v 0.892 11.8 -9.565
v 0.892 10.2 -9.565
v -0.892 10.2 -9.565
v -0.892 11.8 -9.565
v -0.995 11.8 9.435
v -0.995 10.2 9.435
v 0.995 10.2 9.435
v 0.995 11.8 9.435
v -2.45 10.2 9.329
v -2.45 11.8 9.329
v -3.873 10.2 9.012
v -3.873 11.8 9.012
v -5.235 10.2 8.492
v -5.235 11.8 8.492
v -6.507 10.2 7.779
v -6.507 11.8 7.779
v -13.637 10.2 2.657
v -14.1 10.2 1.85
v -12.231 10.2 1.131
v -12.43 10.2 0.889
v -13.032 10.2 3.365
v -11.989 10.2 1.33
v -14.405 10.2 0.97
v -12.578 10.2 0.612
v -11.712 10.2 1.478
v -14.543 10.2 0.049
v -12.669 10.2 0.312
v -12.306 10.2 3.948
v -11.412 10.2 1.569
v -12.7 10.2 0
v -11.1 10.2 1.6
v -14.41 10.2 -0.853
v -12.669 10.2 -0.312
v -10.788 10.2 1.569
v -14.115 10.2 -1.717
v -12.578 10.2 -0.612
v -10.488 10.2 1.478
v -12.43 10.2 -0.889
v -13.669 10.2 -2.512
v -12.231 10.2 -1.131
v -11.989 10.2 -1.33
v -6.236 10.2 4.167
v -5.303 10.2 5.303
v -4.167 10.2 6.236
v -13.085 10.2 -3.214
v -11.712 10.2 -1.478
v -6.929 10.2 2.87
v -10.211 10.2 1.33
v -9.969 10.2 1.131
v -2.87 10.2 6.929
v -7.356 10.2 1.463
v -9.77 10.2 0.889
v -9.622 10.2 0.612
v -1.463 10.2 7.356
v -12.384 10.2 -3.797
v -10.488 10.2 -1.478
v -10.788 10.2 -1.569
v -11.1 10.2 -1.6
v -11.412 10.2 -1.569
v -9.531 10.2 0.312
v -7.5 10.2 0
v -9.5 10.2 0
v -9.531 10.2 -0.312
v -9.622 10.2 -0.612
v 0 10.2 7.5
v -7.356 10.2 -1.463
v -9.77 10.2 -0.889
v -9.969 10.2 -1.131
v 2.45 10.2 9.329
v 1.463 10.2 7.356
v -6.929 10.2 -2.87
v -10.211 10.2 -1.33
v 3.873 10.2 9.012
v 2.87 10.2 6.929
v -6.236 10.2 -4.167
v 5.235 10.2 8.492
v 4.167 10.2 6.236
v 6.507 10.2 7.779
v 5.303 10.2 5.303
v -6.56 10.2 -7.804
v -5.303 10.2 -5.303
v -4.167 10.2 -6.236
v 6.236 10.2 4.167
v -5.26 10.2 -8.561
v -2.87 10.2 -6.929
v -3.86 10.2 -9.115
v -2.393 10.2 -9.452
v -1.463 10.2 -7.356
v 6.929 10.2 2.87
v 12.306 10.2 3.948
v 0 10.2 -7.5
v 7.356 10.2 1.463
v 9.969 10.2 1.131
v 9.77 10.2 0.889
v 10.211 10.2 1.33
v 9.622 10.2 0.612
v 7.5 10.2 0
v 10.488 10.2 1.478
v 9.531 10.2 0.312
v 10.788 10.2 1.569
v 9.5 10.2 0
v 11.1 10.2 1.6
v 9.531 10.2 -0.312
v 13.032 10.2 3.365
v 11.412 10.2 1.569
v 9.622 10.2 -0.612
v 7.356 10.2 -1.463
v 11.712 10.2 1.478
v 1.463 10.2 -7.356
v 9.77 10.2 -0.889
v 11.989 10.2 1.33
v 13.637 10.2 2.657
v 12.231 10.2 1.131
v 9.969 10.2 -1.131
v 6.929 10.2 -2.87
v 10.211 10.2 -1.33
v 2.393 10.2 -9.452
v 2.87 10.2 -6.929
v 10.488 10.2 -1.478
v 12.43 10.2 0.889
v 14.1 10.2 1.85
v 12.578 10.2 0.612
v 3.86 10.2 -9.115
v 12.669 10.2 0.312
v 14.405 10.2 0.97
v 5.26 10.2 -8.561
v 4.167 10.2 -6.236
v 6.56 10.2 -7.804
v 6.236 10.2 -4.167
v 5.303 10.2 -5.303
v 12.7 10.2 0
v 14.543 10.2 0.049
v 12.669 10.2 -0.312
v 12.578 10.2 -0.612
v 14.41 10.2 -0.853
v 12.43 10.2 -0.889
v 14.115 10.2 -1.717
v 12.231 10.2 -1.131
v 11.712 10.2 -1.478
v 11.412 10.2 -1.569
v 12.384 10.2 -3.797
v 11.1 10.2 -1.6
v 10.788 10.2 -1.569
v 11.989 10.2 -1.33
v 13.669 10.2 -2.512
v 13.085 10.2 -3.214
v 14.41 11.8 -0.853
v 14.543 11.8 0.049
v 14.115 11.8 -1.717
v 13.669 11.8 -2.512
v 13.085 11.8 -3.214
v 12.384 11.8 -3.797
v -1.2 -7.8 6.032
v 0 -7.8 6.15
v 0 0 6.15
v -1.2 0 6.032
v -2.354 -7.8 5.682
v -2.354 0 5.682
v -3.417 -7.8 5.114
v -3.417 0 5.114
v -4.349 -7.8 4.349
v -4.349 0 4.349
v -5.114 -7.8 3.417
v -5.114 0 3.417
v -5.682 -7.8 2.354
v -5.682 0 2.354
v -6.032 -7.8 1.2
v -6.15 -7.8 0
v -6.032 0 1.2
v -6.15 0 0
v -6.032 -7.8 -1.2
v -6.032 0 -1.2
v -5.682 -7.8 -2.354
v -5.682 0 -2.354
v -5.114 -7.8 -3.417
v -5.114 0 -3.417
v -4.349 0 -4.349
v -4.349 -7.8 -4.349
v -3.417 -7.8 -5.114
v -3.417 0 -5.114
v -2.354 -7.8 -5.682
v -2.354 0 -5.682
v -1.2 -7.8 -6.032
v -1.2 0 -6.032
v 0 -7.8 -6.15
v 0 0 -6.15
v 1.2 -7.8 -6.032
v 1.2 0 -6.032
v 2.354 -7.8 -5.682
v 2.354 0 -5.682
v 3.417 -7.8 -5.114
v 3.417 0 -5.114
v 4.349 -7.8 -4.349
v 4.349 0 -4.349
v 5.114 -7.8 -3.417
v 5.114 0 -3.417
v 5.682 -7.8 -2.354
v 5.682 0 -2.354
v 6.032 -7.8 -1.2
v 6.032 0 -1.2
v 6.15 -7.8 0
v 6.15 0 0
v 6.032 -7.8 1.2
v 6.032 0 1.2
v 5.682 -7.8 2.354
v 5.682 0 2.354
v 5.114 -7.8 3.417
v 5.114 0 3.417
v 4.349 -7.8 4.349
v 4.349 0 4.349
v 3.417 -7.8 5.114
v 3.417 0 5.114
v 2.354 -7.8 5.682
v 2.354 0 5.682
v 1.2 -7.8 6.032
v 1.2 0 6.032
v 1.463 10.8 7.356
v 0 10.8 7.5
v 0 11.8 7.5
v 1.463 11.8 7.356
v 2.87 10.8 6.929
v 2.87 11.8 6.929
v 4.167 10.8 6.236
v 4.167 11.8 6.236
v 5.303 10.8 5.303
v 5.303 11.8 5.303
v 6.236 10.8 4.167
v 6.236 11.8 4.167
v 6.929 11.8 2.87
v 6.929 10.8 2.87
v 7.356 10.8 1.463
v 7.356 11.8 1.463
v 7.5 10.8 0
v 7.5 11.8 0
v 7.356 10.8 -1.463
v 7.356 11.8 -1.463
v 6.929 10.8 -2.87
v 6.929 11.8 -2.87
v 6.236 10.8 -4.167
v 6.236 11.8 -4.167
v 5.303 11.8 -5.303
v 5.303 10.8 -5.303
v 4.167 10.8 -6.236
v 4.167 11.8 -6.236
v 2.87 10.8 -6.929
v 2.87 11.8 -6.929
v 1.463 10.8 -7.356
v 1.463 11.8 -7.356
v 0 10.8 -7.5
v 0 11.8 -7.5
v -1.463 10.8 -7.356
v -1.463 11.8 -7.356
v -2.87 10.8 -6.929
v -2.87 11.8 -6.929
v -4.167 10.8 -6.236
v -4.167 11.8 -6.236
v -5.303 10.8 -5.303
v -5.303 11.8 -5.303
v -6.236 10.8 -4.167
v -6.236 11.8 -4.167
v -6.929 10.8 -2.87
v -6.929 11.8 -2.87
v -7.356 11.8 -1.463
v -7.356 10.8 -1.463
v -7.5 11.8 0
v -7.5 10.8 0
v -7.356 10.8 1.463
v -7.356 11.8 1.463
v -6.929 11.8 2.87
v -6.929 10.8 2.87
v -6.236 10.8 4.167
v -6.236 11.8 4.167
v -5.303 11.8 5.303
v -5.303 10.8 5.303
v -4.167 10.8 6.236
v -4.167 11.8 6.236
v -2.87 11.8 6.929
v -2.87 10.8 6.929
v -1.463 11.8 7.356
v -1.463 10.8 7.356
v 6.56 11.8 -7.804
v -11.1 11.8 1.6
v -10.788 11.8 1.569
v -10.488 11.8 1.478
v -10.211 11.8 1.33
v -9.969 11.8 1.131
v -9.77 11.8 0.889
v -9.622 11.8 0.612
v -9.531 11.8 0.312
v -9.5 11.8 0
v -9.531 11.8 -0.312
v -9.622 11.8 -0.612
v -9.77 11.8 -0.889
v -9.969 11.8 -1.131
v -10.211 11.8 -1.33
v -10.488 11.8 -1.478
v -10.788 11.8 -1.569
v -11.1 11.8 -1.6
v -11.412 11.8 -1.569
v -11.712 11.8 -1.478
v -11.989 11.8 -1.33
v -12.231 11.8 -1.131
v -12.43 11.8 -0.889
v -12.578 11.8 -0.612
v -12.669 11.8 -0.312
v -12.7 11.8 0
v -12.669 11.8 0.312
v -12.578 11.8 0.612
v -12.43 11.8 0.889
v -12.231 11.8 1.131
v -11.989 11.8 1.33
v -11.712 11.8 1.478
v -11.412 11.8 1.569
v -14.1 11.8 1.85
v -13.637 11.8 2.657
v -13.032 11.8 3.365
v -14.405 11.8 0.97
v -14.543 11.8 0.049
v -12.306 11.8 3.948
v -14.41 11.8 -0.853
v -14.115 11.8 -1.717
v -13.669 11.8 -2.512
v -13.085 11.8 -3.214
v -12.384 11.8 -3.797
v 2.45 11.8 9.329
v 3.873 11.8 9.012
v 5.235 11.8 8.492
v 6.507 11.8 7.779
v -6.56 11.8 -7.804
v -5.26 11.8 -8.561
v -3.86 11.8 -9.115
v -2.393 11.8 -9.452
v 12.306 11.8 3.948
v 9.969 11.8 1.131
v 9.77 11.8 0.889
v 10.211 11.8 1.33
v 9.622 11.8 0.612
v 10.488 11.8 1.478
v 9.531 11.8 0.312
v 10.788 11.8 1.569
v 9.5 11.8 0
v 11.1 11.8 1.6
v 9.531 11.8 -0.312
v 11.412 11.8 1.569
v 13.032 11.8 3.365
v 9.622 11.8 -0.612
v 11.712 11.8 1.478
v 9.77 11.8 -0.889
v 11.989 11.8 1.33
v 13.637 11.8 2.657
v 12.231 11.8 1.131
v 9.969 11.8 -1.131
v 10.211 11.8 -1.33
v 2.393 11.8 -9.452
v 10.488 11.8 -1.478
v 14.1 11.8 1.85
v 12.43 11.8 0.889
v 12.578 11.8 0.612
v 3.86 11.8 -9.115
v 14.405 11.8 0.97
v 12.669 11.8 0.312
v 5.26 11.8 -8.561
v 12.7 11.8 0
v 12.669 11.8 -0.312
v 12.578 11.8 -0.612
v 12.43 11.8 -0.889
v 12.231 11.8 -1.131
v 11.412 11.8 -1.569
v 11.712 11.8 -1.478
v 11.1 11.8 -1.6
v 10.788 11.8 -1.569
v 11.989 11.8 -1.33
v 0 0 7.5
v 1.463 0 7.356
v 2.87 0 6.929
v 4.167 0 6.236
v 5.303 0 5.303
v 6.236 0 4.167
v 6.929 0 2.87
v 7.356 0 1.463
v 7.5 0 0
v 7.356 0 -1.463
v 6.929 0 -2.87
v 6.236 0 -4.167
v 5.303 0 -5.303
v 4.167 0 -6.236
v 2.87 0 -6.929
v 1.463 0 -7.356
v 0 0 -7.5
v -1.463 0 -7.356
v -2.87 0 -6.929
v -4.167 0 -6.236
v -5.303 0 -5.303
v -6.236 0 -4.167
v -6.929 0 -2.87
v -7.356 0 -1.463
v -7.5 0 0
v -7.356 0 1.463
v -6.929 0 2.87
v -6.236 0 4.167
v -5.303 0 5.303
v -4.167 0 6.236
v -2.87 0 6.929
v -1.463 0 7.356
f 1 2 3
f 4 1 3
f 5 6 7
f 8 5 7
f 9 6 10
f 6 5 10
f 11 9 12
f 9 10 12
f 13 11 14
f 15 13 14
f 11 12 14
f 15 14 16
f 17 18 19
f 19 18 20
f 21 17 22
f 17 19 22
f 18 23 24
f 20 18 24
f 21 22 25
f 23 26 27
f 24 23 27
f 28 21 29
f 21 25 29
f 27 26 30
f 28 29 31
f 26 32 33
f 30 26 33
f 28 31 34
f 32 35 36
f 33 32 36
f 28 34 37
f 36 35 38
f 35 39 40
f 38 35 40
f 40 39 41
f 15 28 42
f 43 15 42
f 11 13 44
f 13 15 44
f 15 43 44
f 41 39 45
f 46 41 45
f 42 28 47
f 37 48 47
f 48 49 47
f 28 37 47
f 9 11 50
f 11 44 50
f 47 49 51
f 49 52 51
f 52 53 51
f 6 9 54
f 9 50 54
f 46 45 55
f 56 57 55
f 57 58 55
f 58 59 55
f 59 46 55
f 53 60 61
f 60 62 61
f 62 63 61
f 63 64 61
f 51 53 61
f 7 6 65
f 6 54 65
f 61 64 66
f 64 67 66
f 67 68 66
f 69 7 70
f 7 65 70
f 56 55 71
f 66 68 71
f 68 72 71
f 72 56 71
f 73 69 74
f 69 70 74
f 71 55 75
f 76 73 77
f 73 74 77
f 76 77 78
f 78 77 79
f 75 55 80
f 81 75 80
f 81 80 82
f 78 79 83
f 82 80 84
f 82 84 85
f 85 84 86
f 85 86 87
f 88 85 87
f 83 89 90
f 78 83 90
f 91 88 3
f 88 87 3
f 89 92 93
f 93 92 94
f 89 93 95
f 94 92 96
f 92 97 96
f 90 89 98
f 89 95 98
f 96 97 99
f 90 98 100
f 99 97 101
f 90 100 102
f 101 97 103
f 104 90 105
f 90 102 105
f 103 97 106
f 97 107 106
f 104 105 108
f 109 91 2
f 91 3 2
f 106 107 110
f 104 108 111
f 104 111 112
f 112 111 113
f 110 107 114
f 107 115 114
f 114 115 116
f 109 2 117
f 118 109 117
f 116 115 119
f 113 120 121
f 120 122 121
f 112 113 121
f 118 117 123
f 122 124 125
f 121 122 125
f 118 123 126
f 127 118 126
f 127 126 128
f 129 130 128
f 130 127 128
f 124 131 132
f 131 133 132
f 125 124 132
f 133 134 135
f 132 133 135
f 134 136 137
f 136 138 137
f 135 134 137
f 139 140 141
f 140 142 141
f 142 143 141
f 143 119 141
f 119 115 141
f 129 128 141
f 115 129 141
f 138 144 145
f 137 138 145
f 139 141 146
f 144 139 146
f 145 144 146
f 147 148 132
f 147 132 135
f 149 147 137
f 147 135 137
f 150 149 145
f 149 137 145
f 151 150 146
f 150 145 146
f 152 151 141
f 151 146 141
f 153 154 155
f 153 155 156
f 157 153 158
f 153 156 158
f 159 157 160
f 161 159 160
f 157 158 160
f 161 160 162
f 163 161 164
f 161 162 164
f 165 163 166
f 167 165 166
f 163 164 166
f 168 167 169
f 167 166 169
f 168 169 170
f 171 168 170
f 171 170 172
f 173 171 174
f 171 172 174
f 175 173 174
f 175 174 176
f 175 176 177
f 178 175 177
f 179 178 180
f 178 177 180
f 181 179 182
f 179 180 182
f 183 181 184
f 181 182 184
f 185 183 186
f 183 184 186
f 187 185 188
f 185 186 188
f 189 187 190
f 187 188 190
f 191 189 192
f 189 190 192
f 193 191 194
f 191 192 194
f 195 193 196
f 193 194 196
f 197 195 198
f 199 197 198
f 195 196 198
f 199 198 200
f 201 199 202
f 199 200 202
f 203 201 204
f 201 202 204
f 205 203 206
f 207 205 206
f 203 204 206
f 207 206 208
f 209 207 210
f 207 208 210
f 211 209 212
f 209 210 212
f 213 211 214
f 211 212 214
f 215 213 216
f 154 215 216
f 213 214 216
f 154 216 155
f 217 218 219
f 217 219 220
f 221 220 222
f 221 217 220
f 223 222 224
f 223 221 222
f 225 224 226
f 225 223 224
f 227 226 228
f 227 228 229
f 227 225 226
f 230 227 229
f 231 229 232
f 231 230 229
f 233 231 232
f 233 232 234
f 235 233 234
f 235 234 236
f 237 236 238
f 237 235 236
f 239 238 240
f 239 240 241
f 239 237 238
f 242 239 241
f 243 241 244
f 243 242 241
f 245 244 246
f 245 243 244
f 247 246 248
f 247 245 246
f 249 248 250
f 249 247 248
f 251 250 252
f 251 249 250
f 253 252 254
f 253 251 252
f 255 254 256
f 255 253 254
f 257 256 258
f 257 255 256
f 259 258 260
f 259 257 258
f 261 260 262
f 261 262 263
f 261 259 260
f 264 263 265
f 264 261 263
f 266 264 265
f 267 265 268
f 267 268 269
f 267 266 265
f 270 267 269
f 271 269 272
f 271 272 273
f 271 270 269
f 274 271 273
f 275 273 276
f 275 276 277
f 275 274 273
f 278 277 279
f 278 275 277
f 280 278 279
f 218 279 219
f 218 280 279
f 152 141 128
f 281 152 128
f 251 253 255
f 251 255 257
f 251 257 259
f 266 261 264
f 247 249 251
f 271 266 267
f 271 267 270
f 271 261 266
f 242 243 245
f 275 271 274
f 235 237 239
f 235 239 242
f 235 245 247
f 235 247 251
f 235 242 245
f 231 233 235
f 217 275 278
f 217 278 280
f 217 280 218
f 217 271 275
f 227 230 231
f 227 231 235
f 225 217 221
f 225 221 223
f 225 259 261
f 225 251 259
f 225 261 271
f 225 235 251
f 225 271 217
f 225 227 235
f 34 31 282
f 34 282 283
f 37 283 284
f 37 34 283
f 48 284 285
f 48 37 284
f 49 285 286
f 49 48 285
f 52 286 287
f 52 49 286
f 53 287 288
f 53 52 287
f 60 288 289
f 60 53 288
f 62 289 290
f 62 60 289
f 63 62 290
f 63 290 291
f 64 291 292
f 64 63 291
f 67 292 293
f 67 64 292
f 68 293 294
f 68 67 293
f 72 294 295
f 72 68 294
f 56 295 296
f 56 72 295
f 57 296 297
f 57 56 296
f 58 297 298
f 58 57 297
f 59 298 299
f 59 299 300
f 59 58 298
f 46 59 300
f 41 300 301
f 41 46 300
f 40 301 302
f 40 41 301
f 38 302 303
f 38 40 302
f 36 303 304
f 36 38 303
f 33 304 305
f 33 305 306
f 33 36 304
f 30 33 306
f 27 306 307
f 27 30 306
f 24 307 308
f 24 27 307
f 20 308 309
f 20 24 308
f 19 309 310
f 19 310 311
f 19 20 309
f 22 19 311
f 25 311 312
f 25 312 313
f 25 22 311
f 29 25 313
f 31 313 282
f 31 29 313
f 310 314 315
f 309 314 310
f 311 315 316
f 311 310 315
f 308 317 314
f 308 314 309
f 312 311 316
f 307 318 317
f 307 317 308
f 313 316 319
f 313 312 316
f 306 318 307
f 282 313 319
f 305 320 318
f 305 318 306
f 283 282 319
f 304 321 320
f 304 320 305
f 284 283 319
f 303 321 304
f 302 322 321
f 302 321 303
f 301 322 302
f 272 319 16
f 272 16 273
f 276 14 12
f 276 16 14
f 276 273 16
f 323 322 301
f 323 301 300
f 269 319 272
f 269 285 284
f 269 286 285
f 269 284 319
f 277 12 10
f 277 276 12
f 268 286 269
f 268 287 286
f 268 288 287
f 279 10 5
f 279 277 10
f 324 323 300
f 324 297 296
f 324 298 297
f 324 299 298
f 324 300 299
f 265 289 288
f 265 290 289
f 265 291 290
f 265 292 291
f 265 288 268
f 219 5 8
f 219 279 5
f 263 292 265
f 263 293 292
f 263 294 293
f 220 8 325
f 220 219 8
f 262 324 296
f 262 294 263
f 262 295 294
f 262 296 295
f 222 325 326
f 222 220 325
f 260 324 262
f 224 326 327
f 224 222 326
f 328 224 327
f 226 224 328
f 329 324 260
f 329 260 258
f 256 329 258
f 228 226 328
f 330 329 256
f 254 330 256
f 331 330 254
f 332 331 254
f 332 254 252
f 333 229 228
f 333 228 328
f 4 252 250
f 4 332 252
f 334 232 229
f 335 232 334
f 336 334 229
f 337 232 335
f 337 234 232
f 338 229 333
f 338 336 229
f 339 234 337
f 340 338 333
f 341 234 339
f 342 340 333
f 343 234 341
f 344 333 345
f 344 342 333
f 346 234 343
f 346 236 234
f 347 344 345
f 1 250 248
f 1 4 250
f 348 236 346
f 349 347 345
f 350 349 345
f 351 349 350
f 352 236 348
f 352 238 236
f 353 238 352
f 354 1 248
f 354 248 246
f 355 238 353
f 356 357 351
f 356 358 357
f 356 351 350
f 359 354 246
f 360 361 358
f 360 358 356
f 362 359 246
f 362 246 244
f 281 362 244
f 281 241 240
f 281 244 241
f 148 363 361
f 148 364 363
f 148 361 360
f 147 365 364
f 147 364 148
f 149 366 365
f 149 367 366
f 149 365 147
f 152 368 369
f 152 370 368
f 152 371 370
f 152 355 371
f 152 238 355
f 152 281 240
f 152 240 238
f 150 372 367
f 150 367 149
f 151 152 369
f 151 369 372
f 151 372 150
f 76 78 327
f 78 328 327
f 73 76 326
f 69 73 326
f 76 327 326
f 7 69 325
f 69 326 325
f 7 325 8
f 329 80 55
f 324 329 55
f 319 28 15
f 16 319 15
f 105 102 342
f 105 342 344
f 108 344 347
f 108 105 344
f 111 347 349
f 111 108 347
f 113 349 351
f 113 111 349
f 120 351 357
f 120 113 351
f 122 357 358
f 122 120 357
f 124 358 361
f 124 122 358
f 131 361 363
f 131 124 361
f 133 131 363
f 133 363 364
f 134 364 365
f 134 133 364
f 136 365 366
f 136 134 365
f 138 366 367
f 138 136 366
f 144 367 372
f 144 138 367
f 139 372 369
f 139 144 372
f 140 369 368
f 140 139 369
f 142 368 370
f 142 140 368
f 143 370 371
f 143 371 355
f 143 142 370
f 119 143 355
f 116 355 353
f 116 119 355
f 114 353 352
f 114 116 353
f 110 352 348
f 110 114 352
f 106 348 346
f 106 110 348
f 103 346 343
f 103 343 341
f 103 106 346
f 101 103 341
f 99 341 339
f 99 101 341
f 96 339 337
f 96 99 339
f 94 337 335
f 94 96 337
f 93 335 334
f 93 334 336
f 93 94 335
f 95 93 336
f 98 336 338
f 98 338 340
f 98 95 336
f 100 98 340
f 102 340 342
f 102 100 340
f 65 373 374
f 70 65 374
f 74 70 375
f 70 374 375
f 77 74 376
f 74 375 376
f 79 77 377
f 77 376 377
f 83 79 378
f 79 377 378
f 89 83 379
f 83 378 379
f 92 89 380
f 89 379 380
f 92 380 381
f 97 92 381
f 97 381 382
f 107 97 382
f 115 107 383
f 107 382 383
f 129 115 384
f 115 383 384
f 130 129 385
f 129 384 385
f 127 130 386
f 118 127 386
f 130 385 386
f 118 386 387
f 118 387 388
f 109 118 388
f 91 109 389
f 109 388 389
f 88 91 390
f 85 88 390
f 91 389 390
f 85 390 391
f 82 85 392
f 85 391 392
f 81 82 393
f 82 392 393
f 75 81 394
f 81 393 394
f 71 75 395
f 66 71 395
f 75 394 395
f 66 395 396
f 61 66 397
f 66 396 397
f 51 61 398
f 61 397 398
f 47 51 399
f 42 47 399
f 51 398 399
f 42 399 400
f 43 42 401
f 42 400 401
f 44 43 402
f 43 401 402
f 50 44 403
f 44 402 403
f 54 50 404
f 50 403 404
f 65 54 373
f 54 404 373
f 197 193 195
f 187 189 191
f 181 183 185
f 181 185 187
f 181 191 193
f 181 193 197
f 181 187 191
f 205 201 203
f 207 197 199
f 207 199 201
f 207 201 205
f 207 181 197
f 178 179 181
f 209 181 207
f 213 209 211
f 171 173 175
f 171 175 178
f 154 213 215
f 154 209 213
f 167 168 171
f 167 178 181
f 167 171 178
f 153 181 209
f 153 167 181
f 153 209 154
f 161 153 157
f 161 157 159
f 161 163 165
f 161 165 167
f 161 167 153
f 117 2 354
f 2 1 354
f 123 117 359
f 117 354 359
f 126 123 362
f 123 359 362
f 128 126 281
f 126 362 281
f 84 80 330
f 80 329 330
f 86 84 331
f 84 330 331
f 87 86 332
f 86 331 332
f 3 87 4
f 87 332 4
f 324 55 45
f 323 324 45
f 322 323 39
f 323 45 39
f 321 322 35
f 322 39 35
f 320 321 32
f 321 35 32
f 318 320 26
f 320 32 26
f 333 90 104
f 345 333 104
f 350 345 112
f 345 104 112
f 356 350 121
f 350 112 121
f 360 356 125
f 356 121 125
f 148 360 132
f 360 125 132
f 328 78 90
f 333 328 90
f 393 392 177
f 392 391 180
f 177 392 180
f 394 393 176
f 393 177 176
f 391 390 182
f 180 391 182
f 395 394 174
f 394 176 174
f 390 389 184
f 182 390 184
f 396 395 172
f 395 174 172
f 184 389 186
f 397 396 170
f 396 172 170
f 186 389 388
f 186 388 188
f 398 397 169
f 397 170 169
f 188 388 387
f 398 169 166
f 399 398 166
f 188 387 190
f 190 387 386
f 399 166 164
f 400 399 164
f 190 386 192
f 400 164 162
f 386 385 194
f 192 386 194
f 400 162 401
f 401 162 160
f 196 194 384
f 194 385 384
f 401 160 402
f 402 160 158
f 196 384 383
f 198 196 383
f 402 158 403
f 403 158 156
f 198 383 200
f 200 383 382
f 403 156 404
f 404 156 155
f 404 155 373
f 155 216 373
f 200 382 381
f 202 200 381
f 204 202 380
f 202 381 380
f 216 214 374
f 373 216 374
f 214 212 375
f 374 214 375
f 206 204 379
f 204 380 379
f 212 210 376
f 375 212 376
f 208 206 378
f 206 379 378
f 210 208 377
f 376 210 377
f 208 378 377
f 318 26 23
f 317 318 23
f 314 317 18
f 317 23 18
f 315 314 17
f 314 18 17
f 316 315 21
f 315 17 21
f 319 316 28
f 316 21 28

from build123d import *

# Parameters (mm, degrees)
SKETCH1_R           = 7.5
BOSS_EXTRUDE1_DEPTH = 10.2
SKETCH2_R           = 1.6
BOSS_EXTRUDE2_DEPTH = 1.6
SKETCH3_R           = 6.15
BOSS_EXTRUDE3_DEPTH = 7.8
CUT_EXTRUDE1_START  = -1
SKETCH4_R           = 7.5
CUT_EXTRUDE1_DEPTH  = 1
FILLET1_R           = 5
FILLET2_R           = 10


with BuildPart() as part:
    # Sketch1 → Boss-Extrude1 (new body)
    with BuildSketch(Plane(origin=(0, 0, 0), x_dir=(1, 0, 0), z_dir=(0, 1, 0))):
        with Locations(Location((0, 0, 0), (0, 0, 270))):
            Circle(SKETCH1_R)
    extrude(amount=BOSS_EXTRUDE1_DEPTH)

    # Sketch2 → Boss-Extrude2 (add)
    with BuildSketch(Plane(origin=(0, 10.2, 0), x_dir=(1, 0, 0), z_dir=(0, 1, 0))):
        Polygon((-14.55, 2.306992561), (-14.55, -2.466095496), (-4, -9.43480406), (4, -9.43480406), (14.55, -2.466095496), (14.55, 2.306992561), (4, 9.56519594), (-4, 9.56519594), align=None)
        with Locations(Location((-11.1, 0, 0), (0, 0, 270))):
            Circle(SKETCH2_R, mode=Mode.SUBTRACT)
        with Locations(Location((11.1, 0, 0), (0, 0, 270))):
            Circle(SKETCH2_R, mode=Mode.SUBTRACT)
    extrude(amount=BOSS_EXTRUDE2_DEPTH)

    # Sketch3 → Boss-Extrude3 (add)
    with BuildSketch(Plane.XZ):
        with Locations(Location((0, 0, 0), (0, 0, 90))):
            Circle(SKETCH3_R)
    extrude(amount=BOSS_EXTRUDE3_DEPTH)

    # Sketch4 → Cut-Extrude1 (cut)
    with BuildSketch(Plane(origin=(0, 11.8, 0), x_dir=(1, 0, 0), z_dir=(0, 1, 0)).offset(CUT_EXTRUDE1_START)):
        with Locations(Location((0, 0, 0), (0, 0, 270))):
            Circle(SKETCH4_R)
    extrude(amount=CUT_EXTRUDE1_DEPTH, mode=Mode.SUBTRACT)

    # Fillet1
    # the kernel refuses this fillet: 5 mm, written as the material it takes off along each edge
    with BuildSketch(Plane(origin=(14.55, 3.627226277, -2.306992561), x_dir=(-0.8238567421682754, 0, -0.5667980843156368), z_dir=(0, 1, 0)), Plane(origin=(-14.55, 3.627226277, -2.306992561), x_dir=(0, 0, 1), z_dir=(0, 1, 0))) as fillet1_piece_1:
        with BuildLine():
            CenterArc((FILLET1_R * 0.525821897803, FILLET1_R), FILLET1_R, 214.527246886, 55.472753114)
            Line((-FILLET1_R * 0.298034844366, FILLET1_R * 0.433201915684), (0, 0))
            Line((0, 0), (FILLET1_R * 0.525821897803, 0))
        make_face()
    extrude(amount=14.745547445, mode=Mode.SUBTRACT)
    with BuildSketch(Plane(origin=(14.55, 3.475971105, 2.466095496), x_dir=(-0.8344017794446341, 0, 0.5511566659849338), z_dir=(0, 1, 0)), Plane(origin=(-14.55, 3.475971105, 2.466095496), x_dir=(0, 0, -1), z_dir=(0, 1, 0))) as fillet1_piece_2:
        with BuildLine():
            CenterArc((FILLET1_R * 0.537922311616, -FILLET1_R), FILLET1_R, 90, 56.553598673)
            Line((-FILLET1_R * 0.296479467829, -FILLET1_R * 0.448843334015), (0, 0))
            Line((0, 0), (FILLET1_R * 0.537922311616, 0))
        make_face()
    extrude(amount=15.04805779, mode=Mode.SUBTRACT)

    # Fillet2
    fillet2_edges = [part.edges().sort_by_distance(p)[0] for p in [
        (-4, 11, 9.43480406),
        (4, 11, 9.43480406),
        (4, 11, -9.56519594),
        (-4, 11, -9.56519594),
    ]]
    fillet(fillet2_edges, radius=FILLET2_R)


solid = part.part
